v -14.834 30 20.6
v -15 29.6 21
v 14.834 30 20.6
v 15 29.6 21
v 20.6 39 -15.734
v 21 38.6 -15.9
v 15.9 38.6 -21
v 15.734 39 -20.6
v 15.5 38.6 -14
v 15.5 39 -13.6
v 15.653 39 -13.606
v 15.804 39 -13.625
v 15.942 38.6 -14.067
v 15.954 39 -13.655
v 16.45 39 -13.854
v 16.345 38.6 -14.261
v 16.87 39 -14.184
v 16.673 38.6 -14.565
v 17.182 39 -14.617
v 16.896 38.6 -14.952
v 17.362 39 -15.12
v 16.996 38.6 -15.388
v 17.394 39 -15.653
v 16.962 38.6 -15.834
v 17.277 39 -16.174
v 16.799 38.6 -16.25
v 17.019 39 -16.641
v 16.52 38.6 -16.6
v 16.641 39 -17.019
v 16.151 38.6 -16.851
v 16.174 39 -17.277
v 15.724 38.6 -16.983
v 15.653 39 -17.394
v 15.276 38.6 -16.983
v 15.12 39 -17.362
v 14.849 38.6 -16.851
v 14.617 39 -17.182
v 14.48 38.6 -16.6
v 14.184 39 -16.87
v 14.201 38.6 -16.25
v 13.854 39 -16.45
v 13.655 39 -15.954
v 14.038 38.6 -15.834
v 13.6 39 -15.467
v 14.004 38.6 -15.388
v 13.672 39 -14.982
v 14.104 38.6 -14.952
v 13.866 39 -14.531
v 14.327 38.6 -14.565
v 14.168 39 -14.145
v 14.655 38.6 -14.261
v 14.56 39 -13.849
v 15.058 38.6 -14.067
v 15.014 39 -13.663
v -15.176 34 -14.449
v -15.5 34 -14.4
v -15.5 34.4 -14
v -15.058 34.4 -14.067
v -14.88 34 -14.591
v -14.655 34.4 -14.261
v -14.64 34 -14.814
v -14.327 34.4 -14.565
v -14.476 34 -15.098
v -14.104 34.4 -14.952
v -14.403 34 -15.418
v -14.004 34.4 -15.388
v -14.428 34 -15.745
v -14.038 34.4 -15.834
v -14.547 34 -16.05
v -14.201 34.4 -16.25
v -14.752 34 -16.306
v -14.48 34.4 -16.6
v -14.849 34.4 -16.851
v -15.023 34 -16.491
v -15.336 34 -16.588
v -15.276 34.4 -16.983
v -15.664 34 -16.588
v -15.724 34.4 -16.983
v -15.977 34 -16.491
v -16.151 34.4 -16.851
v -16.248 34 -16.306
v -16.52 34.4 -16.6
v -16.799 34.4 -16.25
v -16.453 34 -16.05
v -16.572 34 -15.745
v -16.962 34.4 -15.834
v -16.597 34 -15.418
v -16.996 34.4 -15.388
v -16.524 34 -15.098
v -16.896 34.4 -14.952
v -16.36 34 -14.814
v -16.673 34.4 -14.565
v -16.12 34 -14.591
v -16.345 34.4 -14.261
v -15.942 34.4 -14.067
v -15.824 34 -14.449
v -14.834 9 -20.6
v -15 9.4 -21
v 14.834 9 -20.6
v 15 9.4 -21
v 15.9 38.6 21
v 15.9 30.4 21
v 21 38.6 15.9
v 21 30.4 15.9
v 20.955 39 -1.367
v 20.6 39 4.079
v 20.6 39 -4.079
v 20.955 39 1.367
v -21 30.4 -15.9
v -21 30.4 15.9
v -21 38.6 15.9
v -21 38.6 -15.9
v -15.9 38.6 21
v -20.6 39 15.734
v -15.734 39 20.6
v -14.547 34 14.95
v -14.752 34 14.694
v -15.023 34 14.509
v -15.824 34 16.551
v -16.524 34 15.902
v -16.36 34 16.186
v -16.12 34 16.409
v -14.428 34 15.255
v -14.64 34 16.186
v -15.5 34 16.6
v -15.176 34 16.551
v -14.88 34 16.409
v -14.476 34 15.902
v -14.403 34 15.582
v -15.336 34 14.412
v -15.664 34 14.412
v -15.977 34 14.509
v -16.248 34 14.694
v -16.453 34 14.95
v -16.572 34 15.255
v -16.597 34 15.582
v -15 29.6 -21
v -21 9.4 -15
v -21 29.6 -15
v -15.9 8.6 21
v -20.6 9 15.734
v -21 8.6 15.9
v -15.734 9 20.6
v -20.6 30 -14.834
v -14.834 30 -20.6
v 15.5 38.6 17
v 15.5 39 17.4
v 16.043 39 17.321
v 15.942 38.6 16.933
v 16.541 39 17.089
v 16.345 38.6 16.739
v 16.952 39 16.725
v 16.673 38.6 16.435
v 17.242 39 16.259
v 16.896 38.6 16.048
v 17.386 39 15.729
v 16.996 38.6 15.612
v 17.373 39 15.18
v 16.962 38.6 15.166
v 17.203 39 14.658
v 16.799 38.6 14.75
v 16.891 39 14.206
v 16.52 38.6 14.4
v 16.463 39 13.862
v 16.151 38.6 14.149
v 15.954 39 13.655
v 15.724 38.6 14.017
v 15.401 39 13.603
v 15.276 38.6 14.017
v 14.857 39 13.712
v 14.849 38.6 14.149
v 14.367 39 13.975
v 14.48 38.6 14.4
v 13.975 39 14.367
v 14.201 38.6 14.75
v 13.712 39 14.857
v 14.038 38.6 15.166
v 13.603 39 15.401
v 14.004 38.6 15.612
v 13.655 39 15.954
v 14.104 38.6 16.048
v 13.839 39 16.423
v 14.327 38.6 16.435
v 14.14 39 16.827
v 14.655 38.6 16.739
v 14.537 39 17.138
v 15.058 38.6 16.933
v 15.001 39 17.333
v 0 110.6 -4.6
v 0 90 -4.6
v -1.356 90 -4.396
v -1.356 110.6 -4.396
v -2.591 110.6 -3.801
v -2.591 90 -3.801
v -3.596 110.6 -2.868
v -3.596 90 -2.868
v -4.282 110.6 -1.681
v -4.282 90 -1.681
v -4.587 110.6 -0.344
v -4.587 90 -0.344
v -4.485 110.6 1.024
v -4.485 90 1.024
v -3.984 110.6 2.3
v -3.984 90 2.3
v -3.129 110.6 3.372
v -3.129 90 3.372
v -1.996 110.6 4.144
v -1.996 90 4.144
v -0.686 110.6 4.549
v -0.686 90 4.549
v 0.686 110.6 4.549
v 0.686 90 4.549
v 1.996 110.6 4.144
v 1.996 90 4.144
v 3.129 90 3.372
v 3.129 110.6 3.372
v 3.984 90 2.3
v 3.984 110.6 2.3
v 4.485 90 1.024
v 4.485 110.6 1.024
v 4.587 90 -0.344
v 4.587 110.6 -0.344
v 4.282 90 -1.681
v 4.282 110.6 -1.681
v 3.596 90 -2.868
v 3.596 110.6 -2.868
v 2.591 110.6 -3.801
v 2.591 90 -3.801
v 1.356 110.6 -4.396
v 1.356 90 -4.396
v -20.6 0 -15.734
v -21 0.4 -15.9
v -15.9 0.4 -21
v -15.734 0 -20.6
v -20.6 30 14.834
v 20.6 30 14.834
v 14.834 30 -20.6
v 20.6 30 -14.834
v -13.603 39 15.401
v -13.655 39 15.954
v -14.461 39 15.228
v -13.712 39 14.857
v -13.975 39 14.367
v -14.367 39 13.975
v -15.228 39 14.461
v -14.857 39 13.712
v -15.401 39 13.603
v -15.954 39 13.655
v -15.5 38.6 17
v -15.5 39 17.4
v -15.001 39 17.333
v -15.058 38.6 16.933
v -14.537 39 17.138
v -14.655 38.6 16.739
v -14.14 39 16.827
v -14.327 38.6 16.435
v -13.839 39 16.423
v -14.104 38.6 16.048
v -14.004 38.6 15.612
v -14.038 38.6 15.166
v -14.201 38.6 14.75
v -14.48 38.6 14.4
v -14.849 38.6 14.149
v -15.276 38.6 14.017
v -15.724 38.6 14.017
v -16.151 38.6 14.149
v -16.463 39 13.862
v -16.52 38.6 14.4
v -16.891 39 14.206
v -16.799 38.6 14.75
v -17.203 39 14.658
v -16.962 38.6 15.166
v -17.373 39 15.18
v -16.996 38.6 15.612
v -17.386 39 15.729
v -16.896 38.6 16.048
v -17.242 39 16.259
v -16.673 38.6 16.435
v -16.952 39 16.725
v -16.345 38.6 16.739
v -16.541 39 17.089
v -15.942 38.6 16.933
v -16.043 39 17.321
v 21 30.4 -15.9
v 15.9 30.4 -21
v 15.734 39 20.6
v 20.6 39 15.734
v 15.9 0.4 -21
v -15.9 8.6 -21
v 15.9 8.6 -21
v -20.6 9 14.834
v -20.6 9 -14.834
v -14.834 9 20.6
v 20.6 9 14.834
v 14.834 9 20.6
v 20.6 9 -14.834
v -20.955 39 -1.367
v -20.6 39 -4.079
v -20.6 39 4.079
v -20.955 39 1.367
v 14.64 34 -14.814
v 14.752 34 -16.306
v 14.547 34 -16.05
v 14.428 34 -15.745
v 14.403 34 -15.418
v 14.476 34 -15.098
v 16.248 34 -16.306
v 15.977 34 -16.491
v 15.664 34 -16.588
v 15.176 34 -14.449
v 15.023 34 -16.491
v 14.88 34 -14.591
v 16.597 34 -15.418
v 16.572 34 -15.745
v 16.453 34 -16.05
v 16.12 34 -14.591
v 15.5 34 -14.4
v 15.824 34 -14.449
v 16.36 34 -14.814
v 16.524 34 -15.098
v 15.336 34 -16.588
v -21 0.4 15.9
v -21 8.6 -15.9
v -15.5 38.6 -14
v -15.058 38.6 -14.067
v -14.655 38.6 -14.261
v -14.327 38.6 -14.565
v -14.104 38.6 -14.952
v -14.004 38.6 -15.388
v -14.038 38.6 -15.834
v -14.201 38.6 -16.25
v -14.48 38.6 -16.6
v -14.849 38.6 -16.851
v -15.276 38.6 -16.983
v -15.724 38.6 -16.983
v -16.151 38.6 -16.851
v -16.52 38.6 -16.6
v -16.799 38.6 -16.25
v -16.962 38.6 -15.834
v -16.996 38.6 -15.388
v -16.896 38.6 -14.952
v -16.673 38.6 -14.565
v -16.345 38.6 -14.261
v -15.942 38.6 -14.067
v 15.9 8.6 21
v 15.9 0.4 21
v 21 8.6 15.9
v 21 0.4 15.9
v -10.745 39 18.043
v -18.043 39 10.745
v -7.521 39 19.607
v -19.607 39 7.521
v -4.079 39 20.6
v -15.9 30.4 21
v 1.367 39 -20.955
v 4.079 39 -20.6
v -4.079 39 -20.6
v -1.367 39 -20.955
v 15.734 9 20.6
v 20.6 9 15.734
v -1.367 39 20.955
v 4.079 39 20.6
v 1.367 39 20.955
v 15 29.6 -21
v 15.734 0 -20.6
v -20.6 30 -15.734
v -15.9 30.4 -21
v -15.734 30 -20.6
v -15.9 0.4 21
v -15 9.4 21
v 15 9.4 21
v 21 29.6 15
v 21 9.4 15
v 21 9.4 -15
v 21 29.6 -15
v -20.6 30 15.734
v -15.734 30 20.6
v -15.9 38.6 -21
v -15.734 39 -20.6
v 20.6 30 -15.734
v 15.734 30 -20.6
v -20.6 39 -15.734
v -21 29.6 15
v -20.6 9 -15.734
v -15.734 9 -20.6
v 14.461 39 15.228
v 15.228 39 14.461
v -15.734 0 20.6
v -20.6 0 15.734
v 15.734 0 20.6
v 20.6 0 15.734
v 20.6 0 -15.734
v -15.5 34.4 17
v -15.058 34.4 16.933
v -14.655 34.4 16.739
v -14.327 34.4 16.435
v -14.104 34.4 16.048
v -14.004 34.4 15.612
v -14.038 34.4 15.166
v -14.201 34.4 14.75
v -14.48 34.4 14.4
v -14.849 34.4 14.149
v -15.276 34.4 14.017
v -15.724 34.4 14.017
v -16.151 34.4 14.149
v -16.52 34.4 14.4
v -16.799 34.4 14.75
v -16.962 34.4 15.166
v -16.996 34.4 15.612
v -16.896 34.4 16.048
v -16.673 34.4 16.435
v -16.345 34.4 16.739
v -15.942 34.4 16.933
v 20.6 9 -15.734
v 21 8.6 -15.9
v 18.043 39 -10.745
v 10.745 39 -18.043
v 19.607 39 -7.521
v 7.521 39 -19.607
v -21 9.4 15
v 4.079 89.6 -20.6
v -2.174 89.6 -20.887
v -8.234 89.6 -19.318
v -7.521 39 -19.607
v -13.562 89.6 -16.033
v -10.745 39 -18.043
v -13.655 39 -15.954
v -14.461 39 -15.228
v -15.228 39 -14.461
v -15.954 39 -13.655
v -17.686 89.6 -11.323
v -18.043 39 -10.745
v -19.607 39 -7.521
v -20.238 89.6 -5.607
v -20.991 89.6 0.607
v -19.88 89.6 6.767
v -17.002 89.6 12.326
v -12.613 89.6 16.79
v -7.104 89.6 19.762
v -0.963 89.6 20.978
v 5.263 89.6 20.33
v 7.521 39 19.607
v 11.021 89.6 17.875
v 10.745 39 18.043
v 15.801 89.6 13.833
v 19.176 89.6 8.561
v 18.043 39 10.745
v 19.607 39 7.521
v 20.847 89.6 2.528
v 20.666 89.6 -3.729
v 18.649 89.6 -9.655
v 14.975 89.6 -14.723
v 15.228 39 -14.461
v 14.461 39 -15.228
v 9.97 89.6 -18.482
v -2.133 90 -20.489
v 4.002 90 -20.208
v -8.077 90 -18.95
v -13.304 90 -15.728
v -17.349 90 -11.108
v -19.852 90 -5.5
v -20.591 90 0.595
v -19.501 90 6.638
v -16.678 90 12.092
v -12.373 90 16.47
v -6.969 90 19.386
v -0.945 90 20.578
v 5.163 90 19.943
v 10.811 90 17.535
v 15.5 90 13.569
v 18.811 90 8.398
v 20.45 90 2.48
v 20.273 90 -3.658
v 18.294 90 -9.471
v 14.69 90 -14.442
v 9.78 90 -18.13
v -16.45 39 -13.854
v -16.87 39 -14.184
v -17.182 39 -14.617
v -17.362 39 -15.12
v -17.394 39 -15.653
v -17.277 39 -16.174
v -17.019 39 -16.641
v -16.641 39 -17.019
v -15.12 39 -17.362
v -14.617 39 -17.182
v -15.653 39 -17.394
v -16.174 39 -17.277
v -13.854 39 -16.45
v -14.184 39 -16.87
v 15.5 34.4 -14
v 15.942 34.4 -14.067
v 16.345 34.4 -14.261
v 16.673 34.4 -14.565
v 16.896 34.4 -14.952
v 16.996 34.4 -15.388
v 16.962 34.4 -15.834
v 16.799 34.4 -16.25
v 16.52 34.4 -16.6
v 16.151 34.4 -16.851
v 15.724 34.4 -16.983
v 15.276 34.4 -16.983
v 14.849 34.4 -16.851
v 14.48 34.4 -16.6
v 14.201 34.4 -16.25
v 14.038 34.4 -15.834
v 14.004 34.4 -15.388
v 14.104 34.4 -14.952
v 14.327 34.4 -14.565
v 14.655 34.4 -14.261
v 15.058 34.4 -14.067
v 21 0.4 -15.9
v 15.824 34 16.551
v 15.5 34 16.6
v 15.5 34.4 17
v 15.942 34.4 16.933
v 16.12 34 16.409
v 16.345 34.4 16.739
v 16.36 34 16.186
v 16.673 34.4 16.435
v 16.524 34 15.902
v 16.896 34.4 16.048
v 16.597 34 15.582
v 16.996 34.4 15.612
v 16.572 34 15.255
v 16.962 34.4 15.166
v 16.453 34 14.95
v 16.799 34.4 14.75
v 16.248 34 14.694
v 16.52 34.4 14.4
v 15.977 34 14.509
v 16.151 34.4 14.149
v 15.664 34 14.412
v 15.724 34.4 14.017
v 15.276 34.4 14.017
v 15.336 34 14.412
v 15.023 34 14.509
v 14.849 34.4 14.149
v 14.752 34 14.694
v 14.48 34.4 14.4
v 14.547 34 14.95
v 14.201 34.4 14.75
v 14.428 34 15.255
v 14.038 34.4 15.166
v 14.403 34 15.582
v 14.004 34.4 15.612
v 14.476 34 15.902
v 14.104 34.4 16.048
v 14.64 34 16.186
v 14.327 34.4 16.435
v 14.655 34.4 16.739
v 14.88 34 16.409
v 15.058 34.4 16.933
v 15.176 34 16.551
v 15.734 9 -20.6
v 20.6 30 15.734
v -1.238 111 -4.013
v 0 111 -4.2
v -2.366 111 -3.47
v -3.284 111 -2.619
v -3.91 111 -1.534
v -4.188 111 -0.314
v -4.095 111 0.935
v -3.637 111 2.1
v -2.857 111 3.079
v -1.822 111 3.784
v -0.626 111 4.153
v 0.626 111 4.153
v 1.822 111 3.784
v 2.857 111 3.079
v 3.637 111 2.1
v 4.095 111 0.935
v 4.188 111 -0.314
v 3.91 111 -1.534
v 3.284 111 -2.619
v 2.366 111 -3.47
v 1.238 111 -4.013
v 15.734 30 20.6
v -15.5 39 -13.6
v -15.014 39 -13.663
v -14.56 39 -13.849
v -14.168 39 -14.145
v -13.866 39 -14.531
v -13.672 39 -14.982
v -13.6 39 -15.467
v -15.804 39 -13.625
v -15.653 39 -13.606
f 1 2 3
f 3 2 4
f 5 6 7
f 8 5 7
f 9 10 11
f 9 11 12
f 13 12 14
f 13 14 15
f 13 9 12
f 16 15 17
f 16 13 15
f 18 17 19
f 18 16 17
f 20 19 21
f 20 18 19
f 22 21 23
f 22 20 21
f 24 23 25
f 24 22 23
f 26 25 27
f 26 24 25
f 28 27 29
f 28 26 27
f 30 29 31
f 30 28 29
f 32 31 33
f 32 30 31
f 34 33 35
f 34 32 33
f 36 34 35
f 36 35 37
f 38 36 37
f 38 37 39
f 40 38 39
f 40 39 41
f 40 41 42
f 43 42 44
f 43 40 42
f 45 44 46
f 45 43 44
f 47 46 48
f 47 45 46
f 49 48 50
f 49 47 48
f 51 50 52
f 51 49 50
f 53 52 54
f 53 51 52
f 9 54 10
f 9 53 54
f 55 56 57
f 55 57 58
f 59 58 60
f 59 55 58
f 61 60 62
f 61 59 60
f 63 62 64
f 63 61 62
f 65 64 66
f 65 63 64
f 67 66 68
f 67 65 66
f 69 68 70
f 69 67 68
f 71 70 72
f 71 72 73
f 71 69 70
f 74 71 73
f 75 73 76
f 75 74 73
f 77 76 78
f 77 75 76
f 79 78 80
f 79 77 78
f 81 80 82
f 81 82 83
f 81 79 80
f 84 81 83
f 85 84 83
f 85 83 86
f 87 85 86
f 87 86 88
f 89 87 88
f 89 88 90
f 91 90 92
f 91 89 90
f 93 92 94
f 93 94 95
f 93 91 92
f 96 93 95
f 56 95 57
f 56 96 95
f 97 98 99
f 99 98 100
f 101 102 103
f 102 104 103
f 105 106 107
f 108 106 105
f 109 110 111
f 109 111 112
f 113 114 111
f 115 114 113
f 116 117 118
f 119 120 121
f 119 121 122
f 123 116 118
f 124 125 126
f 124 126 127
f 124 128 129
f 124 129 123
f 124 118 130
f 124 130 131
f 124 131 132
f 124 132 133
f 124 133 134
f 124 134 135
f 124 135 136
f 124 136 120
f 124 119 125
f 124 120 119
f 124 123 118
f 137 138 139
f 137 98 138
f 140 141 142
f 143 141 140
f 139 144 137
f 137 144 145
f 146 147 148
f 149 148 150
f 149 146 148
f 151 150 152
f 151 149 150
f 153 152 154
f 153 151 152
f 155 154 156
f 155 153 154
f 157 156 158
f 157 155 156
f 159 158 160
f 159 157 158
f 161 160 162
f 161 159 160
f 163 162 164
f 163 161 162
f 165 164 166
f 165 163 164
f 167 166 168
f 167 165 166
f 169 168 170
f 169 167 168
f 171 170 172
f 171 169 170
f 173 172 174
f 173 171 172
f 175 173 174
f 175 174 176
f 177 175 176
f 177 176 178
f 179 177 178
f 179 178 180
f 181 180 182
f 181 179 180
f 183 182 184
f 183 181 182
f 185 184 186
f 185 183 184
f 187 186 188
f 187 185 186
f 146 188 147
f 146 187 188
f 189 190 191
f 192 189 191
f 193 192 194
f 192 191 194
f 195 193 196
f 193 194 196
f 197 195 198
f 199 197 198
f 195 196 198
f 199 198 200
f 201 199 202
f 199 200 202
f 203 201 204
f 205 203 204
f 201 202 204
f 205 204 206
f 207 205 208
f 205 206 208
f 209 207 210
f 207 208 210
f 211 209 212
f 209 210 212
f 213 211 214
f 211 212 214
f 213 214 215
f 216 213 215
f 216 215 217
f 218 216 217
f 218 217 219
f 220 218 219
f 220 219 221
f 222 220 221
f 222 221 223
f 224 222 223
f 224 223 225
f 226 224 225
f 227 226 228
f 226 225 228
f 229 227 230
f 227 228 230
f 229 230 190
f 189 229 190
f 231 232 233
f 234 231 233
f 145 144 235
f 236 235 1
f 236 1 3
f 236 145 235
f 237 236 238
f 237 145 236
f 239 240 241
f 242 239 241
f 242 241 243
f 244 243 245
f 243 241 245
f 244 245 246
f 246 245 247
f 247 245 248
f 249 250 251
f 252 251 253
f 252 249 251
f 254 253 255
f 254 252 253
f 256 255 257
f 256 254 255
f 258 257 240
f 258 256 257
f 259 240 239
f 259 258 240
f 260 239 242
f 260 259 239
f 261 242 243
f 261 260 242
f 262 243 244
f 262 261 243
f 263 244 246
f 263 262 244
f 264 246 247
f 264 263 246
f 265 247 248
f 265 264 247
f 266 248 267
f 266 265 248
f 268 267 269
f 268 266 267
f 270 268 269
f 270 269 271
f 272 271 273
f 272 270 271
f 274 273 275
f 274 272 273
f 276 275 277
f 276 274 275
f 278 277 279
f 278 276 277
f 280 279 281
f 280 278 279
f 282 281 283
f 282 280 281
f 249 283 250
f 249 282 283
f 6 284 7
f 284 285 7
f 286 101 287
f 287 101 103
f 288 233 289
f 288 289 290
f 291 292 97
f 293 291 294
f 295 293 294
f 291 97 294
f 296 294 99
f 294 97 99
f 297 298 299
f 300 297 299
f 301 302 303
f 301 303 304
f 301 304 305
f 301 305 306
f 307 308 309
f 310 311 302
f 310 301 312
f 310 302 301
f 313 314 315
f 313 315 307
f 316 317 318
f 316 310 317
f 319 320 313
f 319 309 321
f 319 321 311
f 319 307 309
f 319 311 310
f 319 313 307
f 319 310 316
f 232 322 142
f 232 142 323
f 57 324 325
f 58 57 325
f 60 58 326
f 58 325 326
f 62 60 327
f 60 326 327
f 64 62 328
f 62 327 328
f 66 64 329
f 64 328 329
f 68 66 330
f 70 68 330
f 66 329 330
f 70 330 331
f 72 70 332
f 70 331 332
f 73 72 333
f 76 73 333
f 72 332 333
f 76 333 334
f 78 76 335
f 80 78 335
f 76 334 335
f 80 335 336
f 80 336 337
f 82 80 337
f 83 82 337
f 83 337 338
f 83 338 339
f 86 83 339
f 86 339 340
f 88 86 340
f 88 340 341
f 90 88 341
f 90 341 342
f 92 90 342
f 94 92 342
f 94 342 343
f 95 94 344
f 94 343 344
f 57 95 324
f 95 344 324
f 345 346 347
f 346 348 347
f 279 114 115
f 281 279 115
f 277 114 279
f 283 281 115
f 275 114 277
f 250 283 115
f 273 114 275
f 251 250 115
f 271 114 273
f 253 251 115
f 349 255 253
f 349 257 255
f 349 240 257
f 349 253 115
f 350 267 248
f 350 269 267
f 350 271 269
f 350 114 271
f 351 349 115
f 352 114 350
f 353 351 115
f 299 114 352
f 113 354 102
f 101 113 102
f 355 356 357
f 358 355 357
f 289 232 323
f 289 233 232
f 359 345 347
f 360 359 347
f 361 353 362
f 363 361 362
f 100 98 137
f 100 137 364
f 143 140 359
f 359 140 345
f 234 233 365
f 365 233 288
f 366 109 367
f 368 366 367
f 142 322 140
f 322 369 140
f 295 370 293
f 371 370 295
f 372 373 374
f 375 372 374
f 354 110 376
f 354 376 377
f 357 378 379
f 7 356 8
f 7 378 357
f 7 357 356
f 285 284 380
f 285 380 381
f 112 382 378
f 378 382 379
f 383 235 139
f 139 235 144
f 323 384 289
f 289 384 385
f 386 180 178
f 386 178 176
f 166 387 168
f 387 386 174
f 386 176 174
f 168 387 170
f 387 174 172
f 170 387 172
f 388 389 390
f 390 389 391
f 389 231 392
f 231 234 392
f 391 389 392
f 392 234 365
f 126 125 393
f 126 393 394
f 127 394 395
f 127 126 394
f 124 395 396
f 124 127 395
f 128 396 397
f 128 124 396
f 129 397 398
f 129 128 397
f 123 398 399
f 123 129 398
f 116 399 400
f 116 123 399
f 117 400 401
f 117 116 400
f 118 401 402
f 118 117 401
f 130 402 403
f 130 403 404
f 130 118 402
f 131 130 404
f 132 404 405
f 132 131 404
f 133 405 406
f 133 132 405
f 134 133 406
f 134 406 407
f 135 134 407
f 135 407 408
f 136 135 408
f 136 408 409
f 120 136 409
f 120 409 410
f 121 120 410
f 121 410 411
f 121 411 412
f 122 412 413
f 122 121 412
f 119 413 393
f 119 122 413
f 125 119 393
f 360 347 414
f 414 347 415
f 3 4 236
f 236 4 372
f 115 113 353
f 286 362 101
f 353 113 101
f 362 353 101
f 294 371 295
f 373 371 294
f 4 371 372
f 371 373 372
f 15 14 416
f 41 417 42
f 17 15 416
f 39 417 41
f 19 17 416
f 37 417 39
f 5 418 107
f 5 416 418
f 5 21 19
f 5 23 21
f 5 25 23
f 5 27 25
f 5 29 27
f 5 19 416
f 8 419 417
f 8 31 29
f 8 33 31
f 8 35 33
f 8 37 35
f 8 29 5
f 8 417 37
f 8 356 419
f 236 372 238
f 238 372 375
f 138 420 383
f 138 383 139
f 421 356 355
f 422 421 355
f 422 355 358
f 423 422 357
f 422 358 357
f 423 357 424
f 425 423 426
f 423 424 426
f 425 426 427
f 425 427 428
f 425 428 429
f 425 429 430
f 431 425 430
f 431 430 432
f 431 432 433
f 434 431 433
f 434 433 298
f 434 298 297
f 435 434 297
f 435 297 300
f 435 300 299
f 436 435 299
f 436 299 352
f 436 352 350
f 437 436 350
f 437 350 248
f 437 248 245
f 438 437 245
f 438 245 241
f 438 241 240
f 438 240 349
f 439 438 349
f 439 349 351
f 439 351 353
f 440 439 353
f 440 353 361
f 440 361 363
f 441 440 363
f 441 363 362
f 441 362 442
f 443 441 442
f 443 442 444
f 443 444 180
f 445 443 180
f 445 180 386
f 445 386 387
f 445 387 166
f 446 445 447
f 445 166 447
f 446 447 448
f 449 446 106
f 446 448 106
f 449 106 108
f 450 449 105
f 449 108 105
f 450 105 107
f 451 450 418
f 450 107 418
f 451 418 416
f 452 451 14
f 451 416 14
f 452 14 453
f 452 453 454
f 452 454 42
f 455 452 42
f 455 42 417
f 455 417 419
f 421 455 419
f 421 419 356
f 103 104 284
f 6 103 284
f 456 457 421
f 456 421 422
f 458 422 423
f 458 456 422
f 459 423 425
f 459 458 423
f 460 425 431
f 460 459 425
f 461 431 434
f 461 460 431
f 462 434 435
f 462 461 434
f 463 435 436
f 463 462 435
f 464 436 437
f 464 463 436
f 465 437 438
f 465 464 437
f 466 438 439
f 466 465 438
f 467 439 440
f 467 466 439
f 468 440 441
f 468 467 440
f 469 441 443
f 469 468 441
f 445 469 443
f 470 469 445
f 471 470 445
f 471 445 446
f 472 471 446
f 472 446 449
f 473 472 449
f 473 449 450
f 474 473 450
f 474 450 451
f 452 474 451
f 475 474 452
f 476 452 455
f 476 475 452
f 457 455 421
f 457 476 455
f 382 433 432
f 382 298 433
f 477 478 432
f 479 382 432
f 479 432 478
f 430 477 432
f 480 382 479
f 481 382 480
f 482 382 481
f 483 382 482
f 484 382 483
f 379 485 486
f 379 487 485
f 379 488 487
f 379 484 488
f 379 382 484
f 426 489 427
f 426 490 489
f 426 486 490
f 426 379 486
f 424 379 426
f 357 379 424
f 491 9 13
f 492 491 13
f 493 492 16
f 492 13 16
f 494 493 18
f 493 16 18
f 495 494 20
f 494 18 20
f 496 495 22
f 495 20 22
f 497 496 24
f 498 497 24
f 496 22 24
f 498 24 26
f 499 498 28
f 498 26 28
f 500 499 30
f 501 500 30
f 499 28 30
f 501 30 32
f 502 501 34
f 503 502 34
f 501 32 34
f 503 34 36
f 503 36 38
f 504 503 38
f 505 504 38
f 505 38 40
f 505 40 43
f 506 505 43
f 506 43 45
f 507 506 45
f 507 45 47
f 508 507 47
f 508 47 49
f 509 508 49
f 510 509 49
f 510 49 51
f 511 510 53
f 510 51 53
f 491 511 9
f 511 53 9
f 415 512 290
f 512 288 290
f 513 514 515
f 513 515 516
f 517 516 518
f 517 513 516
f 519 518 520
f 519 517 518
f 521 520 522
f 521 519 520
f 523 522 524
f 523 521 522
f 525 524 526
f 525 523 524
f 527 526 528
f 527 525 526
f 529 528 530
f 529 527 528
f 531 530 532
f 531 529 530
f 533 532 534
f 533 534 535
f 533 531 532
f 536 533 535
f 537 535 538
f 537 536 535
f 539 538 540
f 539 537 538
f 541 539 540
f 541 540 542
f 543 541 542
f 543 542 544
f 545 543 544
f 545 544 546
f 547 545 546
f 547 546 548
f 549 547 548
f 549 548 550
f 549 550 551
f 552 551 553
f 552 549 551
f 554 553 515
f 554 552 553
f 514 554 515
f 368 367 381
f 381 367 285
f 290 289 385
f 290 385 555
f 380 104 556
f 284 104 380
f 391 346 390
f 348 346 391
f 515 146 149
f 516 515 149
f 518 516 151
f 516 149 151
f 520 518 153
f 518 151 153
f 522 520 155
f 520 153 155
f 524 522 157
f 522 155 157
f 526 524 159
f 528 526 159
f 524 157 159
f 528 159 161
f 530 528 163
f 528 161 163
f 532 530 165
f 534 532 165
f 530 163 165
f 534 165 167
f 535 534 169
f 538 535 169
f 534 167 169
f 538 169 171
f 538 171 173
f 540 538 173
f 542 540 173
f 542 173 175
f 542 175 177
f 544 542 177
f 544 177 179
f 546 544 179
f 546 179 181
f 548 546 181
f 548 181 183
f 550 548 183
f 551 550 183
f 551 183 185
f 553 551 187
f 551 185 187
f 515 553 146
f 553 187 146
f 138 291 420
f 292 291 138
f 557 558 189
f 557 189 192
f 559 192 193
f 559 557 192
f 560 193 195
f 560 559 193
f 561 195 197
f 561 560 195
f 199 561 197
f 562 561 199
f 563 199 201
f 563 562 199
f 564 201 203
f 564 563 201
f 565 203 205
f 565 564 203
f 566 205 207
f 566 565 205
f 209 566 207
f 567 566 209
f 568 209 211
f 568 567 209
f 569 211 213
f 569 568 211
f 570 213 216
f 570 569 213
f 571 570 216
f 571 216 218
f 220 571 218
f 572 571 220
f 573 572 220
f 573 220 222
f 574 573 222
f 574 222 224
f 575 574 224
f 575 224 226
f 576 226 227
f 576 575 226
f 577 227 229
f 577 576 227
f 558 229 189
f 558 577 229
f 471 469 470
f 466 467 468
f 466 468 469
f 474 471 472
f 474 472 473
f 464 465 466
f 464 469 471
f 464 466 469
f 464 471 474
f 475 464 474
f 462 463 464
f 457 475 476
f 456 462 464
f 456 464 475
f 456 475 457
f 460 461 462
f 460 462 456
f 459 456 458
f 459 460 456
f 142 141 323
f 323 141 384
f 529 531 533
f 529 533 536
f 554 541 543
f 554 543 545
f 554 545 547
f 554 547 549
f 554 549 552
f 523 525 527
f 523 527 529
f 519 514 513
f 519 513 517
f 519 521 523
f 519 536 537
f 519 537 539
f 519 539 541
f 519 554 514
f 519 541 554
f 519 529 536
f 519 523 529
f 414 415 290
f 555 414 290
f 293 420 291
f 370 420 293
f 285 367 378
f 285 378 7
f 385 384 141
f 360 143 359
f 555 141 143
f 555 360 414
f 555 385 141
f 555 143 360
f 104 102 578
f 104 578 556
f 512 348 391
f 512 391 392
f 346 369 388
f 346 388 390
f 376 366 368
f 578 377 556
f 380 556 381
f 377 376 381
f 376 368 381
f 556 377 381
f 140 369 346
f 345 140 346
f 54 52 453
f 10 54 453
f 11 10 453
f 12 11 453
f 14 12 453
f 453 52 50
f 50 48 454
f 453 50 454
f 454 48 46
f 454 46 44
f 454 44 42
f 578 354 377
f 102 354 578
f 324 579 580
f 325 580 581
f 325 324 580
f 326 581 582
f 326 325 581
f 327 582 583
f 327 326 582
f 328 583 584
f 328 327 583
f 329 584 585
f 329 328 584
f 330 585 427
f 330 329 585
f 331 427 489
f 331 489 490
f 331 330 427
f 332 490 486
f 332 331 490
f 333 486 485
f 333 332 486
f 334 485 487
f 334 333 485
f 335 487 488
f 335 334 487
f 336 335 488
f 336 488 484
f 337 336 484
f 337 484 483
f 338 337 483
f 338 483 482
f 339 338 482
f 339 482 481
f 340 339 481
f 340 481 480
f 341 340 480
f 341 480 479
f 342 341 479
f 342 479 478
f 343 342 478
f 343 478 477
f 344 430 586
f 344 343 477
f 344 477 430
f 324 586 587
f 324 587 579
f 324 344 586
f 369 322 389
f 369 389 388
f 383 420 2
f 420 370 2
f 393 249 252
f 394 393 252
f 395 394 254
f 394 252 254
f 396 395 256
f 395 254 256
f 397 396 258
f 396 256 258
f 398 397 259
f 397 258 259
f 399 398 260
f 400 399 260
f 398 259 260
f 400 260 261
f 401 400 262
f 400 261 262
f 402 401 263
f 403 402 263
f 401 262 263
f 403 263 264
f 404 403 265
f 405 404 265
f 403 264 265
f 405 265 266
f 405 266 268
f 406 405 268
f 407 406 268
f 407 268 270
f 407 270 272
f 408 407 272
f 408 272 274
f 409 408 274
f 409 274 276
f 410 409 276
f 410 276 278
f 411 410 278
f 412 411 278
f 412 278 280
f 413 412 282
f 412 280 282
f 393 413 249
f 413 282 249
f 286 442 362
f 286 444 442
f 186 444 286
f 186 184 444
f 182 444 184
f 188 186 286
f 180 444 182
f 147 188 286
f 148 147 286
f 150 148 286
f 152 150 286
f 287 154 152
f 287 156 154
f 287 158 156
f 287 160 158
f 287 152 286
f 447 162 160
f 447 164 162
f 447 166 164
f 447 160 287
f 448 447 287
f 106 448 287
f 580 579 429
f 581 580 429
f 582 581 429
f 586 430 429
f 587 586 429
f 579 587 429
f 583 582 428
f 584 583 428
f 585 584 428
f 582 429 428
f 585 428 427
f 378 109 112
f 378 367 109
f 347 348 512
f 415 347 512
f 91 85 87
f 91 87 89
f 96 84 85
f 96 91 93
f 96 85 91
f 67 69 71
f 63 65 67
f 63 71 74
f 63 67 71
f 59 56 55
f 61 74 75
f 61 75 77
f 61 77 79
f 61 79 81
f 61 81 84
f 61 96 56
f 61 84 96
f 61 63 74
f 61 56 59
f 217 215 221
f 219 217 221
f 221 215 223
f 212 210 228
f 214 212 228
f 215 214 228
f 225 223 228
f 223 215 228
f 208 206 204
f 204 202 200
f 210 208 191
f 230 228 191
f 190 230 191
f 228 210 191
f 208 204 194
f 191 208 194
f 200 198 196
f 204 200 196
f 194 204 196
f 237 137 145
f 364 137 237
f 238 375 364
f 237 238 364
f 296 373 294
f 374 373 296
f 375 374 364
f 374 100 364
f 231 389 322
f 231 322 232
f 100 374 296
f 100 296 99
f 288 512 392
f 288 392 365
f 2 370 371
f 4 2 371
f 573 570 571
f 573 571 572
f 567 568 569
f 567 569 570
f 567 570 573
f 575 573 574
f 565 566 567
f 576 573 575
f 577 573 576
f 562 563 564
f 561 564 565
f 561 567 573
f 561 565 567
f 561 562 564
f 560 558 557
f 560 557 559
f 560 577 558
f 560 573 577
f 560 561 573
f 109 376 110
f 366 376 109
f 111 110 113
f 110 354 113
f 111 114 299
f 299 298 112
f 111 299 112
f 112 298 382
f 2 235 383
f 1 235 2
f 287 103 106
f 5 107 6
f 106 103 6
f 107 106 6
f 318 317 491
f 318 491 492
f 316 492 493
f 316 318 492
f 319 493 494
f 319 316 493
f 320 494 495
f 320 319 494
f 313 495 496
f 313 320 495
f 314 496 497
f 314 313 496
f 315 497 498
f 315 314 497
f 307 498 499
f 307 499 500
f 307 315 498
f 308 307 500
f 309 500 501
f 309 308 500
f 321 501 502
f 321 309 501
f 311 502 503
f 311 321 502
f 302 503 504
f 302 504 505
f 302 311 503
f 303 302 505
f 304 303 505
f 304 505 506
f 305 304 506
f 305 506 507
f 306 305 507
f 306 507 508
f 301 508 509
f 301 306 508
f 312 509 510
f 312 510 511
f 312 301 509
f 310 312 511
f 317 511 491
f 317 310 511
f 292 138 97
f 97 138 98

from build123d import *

# Parameters (mm, degrees)
SKETCH1_W           = 42
SKETCH1_H           = 42
BOSS_EXTRUDE1_DEPTH = 9
CHAMFER1_SIZE       = 5.1
CHAMFER2_SIZE       = 0.4
SKETCH3_W           = 42
SKETCH3_H           = 42
BOSS_EXTRUDE3_DEPTH = 21
CHAMFER3_SIZE       = 6
CHAMFER4_SIZE       = 0.4
SKETCH4_W           = 42
SKETCH4_H           = 42
BOSS_EXTRUDE4_DEPTH = 9
CHAMFER5_SIZE       = 5.1
SKETCH5_R           = 11
BOSS_EXTRUDE5_DEPTH = 2
SKETCH7_R           = 1.5
CUT_EXTRUDE1_DEPTH  = 5
CHAMFER6_SIZE       = 0.4
SKETCH6_R           = 2.5
BOSS_EXTRUDE6_DEPTH = 24
CHAMFER7_SIZE       = 0.4
SKETCH8_R           = 21
BOSS_EXTRUDE7_DEPTH = 51
SKETCH9_R           = 4.6
BOSS_EXTRUDE8_DEPTH = 21
CHAMFER8_SIZE       = 0.4
CHAMFER9_SIZE       = 0.4


with BuildPart() as part:
    # Sketch1 → Boss-Extrude1 (new body)
    with BuildSketch(Plane(origin=(0, 0, 0), x_dir=(1, 0, 0), z_dir=(0, 1, 0))):
        Rectangle(SKETCH1_W, SKETCH1_H)
    extrude(amount=BOSS_EXTRUDE1_DEPTH)

    # Chamfer1
    chamfer1_edges = [part.edges().sort_by_distance(p)[0] for p in [
        (21, 4.5, 21),
        (-21, 4.5, 21),
        (-21, 4.5, -21),
        (21, 4.5, -21),
    ]]
    chamfer(chamfer1_edges, length=CHAMFER1_SIZE)

    # Chamfer2
    chamfer2_edges = [part.edges().sort_by_distance(p)[0] for p in [
        (-21, 0, 0),
        (-21, 9, 0),
        (21, 0, 0),
        (0, 0, 21),
        (0, 0, -21),
        (-18.45, 0, 18.45),
        (18.45, 0, 18.45),
        (18.45, 0, -18.45),
        (-18.45, 0, -18.45),
        (0, 9, -21),
        (21, 9, 0),
        (0, 9, 21),
        (-18.45, 9, 18.45),
        (18.45, 9, 18.45),
        (18.45, 9, -18.45),
        (-18.45, 9, -18.45),
    ]]
    chamfer(chamfer2_edges, length=CHAMFER2_SIZE)


with BuildPart() as body_2:
    # Sketch3 → Boss-Extrude3 (new body)
    with BuildSketch(Plane(origin=(0, 9, 0), x_dir=(1, 0, 0), z_dir=(0, 1, 0))):
        Rectangle(SKETCH3_W, SKETCH3_H)
    extrude(amount=BOSS_EXTRUDE3_DEPTH)

    # Chamfer3
    chamfer3_edges = [body_2.edges().sort_by_distance(p)[0] for p in [
        (-21, 19.5, -21),
        (21, 19.5, -21),
        (21, 19.5, 21),
        (-21, 19.5, 21),
    ]]
    chamfer(chamfer3_edges, length=CHAMFER3_SIZE)

    # Chamfer4
    chamfer4_edges = [body_2.edges().sort_by_distance(p)[0] for p in [
        (-21, 9, 0),
        (-21, 30, 0),
        (0, 9, -21),
        (21, 9, 0),
        (0, 9, 21),
        (18, 9, 18),
        (-18, 9, 18),
        (18, 9, -18),
        (-18, 9, -18),
        (0, 30, -21),
        (0, 30, 21),
        (21, 30, 0),
        (18, 30, 18),
        (-18, 30, 18),
        (18, 30, -18),
        (-18, 30, -18),
    ]]
    chamfer(chamfer4_edges, length=CHAMFER4_SIZE)


with BuildPart() as body_3:
    # Sketch4 → Boss-Extrude4 (new body)
    with BuildSketch(Plane(origin=(0, 30, 0), x_dir=(1, 0, 0), z_dir=(0, 1, 0))):
        Rectangle(SKETCH4_W, SKETCH4_H)
    extrude(amount=BOSS_EXTRUDE4_DEPTH)

    # Chamfer5
    chamfer5_edges = [body_3.edges().sort_by_distance(p)[0] for p in [
        (-21, 34.5, -21),
        (21, 34.5, -21),
        (21, 34.5, 21),
        (-21, 34.5, 21),
    ]]
    chamfer(chamfer5_edges, length=CHAMFER5_SIZE)

    # Sketch5 → Boss-Extrude5 (add)
    with BuildSketch(Plane(origin=(0, 39, 0), x_dir=(1, 0, 0), z_dir=(0, 1, 0))):
        with Locations(Location((0, 0, 0), (0, 0, 270))):
            Circle(SKETCH5_R)
    extrude(amount=BOSS_EXTRUDE5_DEPTH)

    # Sketch7 → Cut-Extrude1 (cut)
    with BuildSketch(Plane(origin=(0, 39, 0), x_dir=(1, 0, 0), z_dir=(0, 1, 0))):
        with Locations(Location((15.5, -15.5, 0), (0, 0, 270))):
            Circle(SKETCH7_R)
        with Locations(Location((-15.5, -15.5, 0), (0, 0, 270))):
            Circle(SKETCH7_R)
        with Locations(Location((15.5, 15.5, 0), (0, 0, 270))):
            Circle(SKETCH7_R)
        with Locations(Location((-15.5, 15.5, 0), (0, 0, 270))):
            Circle(SKETCH7_R)
    extrude(amount=-CUT_EXTRUDE1_DEPTH, mode=Mode.SUBTRACT)

    # Chamfer6
    chamfer6_edges = [body_3.edges().sort_by_distance(p)[0] for p in [
        (21, 30, 0),
        (21, 39, 0),
        (-21, 30, 0),
        (0, 30, -21),
        (0, 30, 21),
        (18.45, 30, -18.45),
        (-18.45, 30, -18.45),
        (-18.45, 30, 18.45),
        (18.45, 30, 18.45),
        (0, 39, 21),
        (-21, 39, 0),
        (0, 39, -21),
        (18.45, 39, -18.45),
        (-18.45, 39, -18.45),
        (-18.45, 39, 18.45),
        (18.45, 39, 18.45),
        (0, 39, -11),
        (0, 41, -11),
        (-15.5, 34, 14),
        (-15.5, 39, 14),
        (15.5, 34, -17),
        (15.5, 39, -17),
        (-15.5, 34, -17),
        (-15.5, 39, -17),
        (15.5, 34, 14),
        (15.5, 39, 14),
    ]]
    chamfer(chamfer6_edges, length=CHAMFER6_SIZE)



with BuildPart() as body_4:
    # Sketch6 → Boss-Extrude6 (new body)
    with BuildSketch(Plane(origin=(0, 41, 0), x_dir=(1, 0, 0), z_dir=(0, 1, 0))):
        with Locations(Location((0, 0, 0), (0, 0, 270))):
            Circle(SKETCH6_R)
    extrude(amount=BOSS_EXTRUDE6_DEPTH)

    # Chamfer7
    chamfer7_edges = [body_4.edges().sort_by_distance(p)[0] for p in [
        (0, 65, -2.5),
    ]]
    chamfer(chamfer7_edges, length=CHAMFER7_SIZE)


with BuildPart() as body_3_1:
    add(body_3.part)

    add(body_4.part)  # Boss-Extrude7 merges body 4
    # Sketch8 → Boss-Extrude7 (add)
    with BuildSketch(Plane(origin=(0, 39, 0), x_dir=(1, 0, 0), z_dir=(0, 1, 0))):
        with Locations(Location((0, 0, 0), (0, 0, 78.79918163))):
            Circle(SKETCH8_R)
    extrude(amount=BOSS_EXTRUDE7_DEPTH)

    # Chamfer9
    chamfer9_edges = [body_3_1.edges().sort_by_distance(p)[0] for p in [
        (-4.079215611, 90, 20.6),
    ]]
    chamfer(chamfer9_edges, length=CHAMFER9_SIZE)


with BuildPart() as body_4_2:
    # Sketch9 → Boss-Extrude8 (new body)
    with BuildSketch(Plane(origin=(0, 90, 0), x_dir=(1, 0, 0), z_dir=(0, 1, 0))):
        with Locations(Location((0, 0, 0), (0, 0, 90))):
            Circle(SKETCH9_R)
    extrude(amount=BOSS_EXTRUDE8_DEPTH)

    # Chamfer8
    chamfer8_edges = [body_4_2.edges().sort_by_distance(p)[0] for p in [
        (0, 111, 4.6),
    ]]
    chamfer(chamfer8_edges, length=CHAMFER8_SIZE)


solid = Compound([part.part, body_2.part, body_3_1.part, body_4_2.part])
